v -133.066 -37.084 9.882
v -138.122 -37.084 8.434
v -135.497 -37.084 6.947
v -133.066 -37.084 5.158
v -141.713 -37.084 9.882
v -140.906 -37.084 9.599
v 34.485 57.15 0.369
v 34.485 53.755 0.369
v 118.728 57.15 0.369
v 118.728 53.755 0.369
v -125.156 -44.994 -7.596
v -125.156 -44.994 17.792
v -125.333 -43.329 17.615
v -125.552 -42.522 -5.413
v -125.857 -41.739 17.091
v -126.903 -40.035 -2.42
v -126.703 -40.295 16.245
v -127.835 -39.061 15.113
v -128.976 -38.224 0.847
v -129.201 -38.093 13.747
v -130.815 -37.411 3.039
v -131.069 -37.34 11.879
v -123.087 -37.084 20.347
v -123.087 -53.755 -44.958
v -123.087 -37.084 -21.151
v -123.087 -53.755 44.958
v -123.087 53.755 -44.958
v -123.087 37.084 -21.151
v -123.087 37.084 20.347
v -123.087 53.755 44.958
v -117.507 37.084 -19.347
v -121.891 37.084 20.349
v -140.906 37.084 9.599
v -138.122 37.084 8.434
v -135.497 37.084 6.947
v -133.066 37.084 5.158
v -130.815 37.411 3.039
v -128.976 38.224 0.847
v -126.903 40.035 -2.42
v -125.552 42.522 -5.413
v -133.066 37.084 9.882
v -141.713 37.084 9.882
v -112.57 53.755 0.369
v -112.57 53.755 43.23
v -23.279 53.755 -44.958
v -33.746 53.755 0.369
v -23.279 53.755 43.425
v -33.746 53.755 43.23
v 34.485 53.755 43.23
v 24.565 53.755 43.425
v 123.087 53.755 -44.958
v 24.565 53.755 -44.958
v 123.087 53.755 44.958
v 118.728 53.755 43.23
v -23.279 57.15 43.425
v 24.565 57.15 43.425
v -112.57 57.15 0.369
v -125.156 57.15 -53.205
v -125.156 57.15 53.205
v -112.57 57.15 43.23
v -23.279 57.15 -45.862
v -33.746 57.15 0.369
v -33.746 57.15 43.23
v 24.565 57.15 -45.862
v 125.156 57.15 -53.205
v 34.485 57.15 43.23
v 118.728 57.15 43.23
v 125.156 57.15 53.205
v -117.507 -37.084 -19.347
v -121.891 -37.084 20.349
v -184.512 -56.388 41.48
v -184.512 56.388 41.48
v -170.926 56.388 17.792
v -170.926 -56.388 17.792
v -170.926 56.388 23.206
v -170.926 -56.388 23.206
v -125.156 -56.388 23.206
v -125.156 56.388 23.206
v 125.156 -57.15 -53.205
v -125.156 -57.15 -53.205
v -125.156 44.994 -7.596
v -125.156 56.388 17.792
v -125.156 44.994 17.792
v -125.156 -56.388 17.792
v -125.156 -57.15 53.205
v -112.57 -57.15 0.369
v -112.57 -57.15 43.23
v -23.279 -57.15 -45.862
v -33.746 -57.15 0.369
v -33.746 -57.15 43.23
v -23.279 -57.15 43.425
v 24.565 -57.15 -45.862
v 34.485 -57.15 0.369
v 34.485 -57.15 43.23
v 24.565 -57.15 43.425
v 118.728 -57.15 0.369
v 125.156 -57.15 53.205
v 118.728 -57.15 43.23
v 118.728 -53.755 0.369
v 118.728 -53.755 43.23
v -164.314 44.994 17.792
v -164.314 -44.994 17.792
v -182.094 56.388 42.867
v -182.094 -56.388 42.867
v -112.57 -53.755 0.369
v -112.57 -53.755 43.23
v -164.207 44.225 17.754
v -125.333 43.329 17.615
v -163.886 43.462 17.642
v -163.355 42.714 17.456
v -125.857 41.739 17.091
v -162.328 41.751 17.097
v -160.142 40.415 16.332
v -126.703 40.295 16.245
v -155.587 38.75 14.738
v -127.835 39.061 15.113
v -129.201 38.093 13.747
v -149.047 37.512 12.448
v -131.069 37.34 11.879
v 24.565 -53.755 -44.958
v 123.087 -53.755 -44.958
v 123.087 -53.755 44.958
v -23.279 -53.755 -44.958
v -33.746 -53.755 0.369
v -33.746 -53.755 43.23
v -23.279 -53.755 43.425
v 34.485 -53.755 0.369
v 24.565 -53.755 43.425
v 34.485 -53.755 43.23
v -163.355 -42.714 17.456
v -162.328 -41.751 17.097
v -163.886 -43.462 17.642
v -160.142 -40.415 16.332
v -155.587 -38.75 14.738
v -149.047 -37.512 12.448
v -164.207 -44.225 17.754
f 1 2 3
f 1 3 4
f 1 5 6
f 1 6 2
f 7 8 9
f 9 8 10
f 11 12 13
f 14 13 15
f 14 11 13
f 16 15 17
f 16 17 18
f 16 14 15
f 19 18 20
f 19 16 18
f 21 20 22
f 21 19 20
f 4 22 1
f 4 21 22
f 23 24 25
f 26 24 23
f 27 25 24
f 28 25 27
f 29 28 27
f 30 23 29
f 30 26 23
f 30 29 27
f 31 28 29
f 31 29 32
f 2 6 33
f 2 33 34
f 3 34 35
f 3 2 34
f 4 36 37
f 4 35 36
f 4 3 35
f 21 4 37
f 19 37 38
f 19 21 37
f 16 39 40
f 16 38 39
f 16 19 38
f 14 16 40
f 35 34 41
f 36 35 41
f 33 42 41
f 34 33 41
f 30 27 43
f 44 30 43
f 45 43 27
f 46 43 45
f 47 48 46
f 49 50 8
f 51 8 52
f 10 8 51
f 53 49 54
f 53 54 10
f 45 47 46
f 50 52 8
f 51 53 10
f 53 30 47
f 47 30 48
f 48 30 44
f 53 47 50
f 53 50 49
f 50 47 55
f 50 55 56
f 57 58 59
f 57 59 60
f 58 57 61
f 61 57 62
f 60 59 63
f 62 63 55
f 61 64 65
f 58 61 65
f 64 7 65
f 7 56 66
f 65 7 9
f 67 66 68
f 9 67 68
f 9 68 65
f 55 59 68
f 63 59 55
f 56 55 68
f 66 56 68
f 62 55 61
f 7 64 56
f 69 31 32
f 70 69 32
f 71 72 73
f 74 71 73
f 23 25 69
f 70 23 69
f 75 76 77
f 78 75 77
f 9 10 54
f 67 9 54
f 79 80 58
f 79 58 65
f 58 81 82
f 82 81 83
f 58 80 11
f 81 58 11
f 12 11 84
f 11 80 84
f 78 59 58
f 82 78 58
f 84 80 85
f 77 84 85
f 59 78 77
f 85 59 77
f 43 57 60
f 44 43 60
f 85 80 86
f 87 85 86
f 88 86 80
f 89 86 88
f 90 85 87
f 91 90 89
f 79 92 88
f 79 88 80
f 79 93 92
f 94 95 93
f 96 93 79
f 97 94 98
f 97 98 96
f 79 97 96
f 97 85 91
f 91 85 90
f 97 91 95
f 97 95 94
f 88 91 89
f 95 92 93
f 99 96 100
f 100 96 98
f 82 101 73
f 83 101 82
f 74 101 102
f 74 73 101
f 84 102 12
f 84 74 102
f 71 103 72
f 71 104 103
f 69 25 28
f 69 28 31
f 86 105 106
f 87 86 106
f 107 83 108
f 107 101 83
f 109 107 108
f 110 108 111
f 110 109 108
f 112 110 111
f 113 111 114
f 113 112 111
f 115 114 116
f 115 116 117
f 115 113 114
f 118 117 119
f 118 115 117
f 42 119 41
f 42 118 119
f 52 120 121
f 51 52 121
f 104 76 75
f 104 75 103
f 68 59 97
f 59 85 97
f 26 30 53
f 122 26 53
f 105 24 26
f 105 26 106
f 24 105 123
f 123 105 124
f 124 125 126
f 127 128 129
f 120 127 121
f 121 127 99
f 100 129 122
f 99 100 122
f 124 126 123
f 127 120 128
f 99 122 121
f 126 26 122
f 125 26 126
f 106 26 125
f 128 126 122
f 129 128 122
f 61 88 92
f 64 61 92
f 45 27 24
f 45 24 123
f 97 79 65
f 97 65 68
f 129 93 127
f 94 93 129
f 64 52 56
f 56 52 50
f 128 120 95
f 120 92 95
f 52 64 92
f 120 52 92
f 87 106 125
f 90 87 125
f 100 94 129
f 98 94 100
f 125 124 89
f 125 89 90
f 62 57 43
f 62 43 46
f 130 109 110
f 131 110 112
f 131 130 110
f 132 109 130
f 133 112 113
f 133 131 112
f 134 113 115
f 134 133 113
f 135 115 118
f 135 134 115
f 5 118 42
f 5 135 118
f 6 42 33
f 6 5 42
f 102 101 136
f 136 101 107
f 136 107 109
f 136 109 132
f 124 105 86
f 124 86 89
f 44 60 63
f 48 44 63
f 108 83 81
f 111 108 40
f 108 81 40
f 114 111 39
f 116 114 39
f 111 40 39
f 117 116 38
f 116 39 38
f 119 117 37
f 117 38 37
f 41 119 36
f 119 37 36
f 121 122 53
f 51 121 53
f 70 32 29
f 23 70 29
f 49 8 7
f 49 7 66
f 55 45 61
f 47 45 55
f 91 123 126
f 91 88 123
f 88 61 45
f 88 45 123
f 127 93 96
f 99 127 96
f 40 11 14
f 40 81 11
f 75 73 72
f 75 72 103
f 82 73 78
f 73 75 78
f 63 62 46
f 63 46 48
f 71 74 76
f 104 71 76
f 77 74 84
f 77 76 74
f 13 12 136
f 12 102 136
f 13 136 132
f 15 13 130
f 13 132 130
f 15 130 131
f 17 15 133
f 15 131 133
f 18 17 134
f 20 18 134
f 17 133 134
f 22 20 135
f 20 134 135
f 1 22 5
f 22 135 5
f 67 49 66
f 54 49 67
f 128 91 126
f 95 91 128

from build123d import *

# Parameters (mm, degrees)
F0_W      = 250.311822
F0_H      = 106.41057
F1_DEPTH  = 57.15
F2_W      = 246.1734
F2_H      = 107.510934
F3_DEPTH  = 44.958
F4_W      = 78.823588
F4_H      = 42.86033
F4_W_2    = 84.242716
F5_DEPTH  = 207.518
F6_W      = 47.32091
F6_H      = 5.413929
F7_DEPTH  = 56.388
F9_DEPTH  = 37.084
F10_R     = 7.910412
F11_R     = 6.211921
F12_W     = 47.843273
F12_H     = 89.287125
F13_DEPTH = 78.74


with BuildPart() as f1:
    # F0 (on Front) → F1 (new body, symmetric)
    with BuildSketch(Plane.XZ):
        Rectangle(F0_W, F0_H)
    extrude(amount=F1_DEPTH, both=True)

    # F2 (on Top) → F3 (cut, symmetric)
    with BuildSketch(Plane.XY):
        Rectangle(F2_W, F2_H)
    extrude(amount=F3_DEPTH, both=True, mode=Mode.SUBTRACT)

    # F4 (on Front) → F5 (cut, symmetric)
    with BuildSketch(Plane.XZ):
        with Locations((-73.158145, 21.79965)):
            Rectangle(F4_W, F4_H)
        with Locations((76.606676, 21.79965)):
            Rectangle(F4_W_2, F4_H)
    extrude(amount=F5_DEPTH, both=True, mode=Mode.SUBTRACT)

    # F6 (on Front) → F7 (join, symmetric)
    with BuildSketch(Plane.XZ):
        with Locations((-147.265818, 20.498943)):
            Rectangle(F6_W, F6_H)
        Polygon((-170.926273, 17.791979), (-170.926273, 23.205908), (-182.093537, 42.867189), (-184.512094, 41.480076), align=None)
    extrude(amount=F7_DEPTH, both=True)

    # F8 (on Front) → F9 (join, symmetric)
    with BuildSketch(Plane.XZ):
        with BuildLine():
            Line((-121.890865, 20.348705), (-171.379492, 20.264825))
            Line((-171.379492, 20.264825), (-140.906081, 9.599128))
            ThreePointArc((-140.906081, 9.599128), (-126.654572, -2.899753), (-125.059903, -21.788495))
            Line((-125.059903, -21.788495), (-117.50719, -19.347493))
            Line((-117.50719, -19.347493), (-121.890865, 20.348705))
        make_face()
    extrude(amount=F9_DEPTH, both=True)

    # F10
    f10_edges = [f1.edges().sort_by_distance(p)[0] for p in [
        (-144.735065, -37.084, 17.791979),
        (-125.155911, -37.084, 5.621087),
        (-125.155911, 37.084, 5.621087),
        (-144.735065, 37.084, 17.791979),
    ]]
    fillet(f10_edges, radius=F10_R)

    # F11
    f11_edges = [f1.edges().sort_by_distance(p)[0] for p in [
        (-125.155911, 41.039206, -6.549804),
        (-125.155911, 0, -6.549804),
        (-125.155911, -41.039206, -6.549804),
    ]]
    fillet(f11_edges, radius=F11_R)

    # F12 (on Front) → F13 (cut, symmetric)
    with BuildSketch(Plane.XZ):
        with Locations((0.642964, -1.218934)):
            Rectangle(F12_W, F12_H)
    extrude(amount=F13_DEPTH, both=True, mode=Mode.SUBTRACT)


solid = f1.part
